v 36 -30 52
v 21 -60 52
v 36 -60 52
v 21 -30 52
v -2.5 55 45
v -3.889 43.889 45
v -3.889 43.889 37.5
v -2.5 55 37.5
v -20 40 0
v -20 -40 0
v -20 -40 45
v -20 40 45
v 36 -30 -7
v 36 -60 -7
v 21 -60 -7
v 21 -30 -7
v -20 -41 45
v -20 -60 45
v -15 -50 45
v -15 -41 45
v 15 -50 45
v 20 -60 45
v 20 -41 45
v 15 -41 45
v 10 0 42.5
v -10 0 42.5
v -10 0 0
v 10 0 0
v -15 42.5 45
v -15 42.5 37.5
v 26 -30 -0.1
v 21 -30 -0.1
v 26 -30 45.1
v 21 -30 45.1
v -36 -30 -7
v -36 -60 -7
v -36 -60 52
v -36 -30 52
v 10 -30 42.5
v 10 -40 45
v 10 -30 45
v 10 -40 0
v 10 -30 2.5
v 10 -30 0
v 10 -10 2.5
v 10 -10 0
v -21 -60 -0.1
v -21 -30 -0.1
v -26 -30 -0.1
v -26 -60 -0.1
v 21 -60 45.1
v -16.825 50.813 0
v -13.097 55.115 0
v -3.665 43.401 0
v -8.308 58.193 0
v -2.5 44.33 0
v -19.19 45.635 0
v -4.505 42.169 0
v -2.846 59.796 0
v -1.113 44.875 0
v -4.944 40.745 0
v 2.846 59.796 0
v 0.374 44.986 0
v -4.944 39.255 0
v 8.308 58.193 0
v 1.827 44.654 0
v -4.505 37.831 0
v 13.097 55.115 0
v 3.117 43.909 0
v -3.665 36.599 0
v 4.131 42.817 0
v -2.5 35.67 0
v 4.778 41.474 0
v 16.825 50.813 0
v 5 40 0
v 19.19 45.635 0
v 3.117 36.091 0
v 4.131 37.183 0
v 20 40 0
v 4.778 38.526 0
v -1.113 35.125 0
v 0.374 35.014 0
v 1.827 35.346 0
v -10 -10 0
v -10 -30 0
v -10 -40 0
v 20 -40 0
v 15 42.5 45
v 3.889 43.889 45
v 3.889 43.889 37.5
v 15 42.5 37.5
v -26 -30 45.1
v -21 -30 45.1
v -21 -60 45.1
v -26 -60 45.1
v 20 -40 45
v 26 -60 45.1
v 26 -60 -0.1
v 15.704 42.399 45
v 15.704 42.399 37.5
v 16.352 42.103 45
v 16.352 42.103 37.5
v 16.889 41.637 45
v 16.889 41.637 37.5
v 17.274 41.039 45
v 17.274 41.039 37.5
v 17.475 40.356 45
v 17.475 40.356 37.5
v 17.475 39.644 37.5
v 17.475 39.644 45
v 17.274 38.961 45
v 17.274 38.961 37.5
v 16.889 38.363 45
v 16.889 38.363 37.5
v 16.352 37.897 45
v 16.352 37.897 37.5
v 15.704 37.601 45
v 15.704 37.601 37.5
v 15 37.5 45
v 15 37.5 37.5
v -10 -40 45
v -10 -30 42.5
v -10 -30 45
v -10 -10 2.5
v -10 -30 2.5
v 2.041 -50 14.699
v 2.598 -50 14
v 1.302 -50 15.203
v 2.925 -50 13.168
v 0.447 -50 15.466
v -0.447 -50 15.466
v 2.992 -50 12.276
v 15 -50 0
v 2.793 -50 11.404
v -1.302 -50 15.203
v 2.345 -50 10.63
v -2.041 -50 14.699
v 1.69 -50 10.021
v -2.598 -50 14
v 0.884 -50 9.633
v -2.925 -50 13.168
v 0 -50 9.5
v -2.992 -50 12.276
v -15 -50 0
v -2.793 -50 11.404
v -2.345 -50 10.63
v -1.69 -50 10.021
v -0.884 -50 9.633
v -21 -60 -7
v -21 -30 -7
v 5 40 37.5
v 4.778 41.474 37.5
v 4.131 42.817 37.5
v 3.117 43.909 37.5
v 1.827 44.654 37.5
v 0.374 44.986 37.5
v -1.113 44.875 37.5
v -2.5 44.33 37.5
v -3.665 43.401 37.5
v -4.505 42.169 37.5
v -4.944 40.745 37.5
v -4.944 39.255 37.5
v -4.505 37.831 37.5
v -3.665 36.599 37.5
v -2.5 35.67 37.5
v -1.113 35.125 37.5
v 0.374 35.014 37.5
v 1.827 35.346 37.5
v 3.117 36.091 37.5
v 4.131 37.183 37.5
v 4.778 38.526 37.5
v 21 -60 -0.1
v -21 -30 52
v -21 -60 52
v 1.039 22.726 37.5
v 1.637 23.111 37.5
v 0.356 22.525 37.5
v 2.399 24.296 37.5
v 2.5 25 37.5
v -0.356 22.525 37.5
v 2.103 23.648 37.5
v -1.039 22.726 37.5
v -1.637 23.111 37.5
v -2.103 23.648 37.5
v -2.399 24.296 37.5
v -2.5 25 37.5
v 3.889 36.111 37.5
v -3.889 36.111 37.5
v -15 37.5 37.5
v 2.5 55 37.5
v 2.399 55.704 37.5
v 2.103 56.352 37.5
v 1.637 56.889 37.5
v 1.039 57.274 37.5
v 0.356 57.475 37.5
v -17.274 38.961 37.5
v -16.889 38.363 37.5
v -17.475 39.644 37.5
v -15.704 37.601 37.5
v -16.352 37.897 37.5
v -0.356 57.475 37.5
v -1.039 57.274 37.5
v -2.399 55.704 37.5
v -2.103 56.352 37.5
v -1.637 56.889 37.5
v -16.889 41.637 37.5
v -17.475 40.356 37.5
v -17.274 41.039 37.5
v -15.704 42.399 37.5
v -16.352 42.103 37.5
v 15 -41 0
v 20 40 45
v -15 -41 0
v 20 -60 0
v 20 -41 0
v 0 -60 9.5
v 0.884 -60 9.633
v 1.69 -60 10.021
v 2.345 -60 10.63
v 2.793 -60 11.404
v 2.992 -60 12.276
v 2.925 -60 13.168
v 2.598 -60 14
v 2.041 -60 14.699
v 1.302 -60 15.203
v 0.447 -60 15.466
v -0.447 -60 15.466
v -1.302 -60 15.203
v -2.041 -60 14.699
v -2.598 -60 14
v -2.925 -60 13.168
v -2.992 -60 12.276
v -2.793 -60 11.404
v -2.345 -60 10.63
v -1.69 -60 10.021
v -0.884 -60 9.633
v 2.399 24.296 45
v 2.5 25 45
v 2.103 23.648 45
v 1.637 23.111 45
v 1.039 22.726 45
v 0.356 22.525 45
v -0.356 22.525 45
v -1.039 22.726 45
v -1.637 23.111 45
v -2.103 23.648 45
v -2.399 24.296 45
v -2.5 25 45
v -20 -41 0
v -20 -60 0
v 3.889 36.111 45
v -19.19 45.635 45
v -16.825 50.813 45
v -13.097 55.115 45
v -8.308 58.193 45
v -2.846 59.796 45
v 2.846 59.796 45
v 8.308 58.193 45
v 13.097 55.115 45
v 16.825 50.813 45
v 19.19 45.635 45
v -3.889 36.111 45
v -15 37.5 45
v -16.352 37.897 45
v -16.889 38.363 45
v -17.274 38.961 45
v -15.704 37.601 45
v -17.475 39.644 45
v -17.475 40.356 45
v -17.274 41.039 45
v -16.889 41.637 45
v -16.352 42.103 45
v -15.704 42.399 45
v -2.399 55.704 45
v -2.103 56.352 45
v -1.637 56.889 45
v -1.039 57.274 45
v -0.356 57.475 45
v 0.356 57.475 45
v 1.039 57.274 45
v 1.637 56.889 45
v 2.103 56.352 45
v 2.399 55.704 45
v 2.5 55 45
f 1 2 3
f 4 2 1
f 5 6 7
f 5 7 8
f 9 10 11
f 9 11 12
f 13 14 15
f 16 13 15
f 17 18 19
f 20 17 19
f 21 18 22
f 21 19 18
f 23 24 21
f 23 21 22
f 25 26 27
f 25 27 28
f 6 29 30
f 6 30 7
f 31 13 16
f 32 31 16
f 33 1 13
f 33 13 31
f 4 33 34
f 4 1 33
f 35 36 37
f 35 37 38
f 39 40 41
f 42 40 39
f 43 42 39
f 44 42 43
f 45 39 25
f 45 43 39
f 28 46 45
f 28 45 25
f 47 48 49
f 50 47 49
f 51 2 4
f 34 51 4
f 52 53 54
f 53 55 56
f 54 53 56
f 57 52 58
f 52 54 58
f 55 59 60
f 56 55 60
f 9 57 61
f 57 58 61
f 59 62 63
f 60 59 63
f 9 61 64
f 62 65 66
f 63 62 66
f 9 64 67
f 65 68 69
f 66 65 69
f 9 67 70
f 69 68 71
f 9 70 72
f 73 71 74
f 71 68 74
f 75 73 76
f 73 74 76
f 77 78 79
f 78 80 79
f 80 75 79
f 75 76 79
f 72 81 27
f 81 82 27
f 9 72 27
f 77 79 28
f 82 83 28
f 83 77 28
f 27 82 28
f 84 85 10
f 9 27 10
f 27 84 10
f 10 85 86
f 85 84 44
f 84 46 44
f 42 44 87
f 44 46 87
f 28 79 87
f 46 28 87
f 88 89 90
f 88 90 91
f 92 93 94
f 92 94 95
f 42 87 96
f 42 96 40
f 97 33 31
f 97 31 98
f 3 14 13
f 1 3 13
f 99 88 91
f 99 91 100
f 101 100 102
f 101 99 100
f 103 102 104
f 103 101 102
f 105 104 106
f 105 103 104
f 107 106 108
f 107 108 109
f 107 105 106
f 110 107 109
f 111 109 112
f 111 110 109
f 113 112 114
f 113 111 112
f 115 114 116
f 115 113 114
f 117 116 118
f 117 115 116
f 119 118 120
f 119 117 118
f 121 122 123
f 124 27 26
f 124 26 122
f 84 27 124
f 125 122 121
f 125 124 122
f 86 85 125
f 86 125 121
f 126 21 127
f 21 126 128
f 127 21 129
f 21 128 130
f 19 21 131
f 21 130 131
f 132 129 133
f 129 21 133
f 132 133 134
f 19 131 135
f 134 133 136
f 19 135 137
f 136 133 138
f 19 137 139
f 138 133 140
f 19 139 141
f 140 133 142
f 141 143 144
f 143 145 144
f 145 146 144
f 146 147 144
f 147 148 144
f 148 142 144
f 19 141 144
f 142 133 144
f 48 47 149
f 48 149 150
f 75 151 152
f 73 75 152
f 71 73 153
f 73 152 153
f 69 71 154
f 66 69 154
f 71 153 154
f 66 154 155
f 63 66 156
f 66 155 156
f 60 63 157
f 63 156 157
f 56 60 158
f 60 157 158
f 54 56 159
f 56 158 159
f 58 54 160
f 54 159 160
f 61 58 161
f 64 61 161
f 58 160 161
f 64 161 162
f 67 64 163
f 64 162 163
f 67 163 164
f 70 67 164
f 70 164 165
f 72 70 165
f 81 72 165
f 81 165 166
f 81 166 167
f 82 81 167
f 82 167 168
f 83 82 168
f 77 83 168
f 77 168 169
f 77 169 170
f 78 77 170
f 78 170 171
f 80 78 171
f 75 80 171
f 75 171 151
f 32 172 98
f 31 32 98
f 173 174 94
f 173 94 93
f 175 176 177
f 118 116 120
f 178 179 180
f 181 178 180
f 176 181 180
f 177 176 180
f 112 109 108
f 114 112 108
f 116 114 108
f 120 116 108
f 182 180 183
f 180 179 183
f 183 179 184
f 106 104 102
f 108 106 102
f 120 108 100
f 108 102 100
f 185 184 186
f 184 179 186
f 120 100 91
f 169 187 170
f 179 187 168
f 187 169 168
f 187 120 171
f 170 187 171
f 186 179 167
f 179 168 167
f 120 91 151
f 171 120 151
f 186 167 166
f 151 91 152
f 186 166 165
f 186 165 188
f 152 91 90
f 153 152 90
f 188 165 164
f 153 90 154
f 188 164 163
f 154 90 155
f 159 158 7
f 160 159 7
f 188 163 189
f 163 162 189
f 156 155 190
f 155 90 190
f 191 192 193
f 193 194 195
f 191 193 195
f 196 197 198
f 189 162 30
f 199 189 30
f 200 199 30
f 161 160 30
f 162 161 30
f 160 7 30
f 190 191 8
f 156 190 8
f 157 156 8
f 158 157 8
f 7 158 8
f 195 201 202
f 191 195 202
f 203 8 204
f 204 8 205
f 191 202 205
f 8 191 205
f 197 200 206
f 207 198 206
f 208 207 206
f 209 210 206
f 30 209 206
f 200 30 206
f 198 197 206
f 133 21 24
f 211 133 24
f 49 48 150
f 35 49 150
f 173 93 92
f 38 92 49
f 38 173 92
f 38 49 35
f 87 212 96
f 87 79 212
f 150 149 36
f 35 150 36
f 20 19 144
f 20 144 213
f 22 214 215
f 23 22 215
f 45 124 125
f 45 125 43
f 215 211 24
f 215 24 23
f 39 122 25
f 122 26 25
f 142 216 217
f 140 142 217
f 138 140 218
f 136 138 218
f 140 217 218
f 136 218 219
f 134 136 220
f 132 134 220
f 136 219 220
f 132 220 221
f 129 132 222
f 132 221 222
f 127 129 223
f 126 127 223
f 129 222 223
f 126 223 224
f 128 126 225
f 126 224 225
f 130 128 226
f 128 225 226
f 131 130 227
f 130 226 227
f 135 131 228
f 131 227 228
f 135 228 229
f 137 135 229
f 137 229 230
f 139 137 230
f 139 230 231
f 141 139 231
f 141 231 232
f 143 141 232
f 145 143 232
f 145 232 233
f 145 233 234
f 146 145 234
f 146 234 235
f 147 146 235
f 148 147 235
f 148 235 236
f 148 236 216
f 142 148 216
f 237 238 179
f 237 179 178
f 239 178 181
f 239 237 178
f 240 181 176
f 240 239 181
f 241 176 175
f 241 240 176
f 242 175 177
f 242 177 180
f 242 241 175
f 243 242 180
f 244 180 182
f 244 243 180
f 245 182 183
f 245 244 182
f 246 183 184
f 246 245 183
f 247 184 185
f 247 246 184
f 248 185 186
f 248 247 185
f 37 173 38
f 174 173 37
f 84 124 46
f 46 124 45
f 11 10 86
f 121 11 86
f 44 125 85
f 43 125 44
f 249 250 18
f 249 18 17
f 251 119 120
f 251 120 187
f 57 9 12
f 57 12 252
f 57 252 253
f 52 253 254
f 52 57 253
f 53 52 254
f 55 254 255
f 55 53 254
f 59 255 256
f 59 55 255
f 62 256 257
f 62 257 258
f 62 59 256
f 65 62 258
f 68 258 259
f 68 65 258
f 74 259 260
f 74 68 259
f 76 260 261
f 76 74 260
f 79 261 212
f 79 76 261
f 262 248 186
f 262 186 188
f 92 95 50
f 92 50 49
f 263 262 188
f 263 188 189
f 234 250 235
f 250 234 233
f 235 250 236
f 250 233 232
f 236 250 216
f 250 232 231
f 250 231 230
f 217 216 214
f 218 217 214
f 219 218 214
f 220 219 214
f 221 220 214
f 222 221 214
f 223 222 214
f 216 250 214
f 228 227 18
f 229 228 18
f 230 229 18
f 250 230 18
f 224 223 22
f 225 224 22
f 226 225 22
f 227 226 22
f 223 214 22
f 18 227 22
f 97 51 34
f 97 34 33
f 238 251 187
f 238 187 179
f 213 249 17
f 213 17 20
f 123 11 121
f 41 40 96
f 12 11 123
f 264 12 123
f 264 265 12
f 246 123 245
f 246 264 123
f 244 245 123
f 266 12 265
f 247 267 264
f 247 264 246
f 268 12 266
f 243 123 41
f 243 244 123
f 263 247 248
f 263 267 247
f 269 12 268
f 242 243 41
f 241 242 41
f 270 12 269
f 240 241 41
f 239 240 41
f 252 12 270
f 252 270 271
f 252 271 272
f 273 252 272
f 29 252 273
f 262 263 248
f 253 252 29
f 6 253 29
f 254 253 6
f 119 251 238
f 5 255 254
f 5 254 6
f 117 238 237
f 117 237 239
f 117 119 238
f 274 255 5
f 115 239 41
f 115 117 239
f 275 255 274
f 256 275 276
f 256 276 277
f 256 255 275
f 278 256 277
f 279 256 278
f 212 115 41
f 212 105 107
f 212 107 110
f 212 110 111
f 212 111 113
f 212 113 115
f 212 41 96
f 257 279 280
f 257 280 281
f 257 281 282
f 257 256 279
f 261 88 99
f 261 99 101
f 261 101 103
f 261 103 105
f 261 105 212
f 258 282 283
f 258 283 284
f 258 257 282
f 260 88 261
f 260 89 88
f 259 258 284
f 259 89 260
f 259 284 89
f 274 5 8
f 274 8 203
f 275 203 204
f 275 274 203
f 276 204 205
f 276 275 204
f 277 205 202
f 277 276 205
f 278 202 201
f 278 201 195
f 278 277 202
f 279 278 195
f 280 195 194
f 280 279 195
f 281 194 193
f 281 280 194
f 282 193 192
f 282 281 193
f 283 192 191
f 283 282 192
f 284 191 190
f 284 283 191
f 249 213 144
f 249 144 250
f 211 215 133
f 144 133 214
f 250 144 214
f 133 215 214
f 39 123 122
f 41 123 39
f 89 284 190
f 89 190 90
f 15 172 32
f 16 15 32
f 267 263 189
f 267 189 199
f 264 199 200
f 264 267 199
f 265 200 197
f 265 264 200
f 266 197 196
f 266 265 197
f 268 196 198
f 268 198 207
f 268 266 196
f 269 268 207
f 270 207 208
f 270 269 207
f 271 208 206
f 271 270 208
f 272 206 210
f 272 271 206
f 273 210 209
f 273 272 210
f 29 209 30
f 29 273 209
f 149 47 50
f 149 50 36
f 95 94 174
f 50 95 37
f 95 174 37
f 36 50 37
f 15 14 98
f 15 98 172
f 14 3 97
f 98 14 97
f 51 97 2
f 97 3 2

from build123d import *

# Parameters (mm, degrees)
SALIENTE_EXTRUIR1_DEPTH = 45
CORTAR_EXTRUIR1_DEPTH   = 7.5
CROQUIS3_R              = 5
CORTAR_EXTRUIR2_DEPTH   = 57.5
CROQUIS4_W              = 41.868476083
CROQUIS4_H              = 21.001033166
CORTAR_EXTRUIR3_DEPTH   = 57.5
CORTAR_EXTRUIR4_START   = -2.5
CORTAR_EXTRUIR4_DEPTH   = 40
CORTAR_EXTRUIR5_DEPTH   = 45
CORTAR_EXTRUIR7_START   = -40
CROQUIS7_W              = 20
CROQUIS7_H              = 10
CORTAR_EXTRUIR7_DEPTH   = 20
SALIENTE_EXTRUIR2_DEPTH = 45
CROQUIS9_W              = 5
CROQUIS9_H              = 10
CORTAR_EXTRUIR8_DEPTH   = 45
CROQUIS10_R             = 3
CORTAR_EXTRUIR9_DEPTH   = 20
CROQUIS11_W             = 40
CROQUIS11_H             = 1
CORTAR_EXTRUIR12_DEPTH  = 45
CROQUIS12_W             = 5
CROQUIS12_H             = 30
SALIENTE_EXTRUIR3_DEPTH = 7
CROQUIS13_W             = 30
CROQUIS13_H             = 52
SALIENTE_EXTRUIR4_DEPTH = 16
CROQUIS14_W             = 30
CROQUIS14_H             = 52
SALIENTE_EXTRUIR5_DEPTH = 16
CROQUIS15_W             = 6
CROQUIS15_H             = 30
CORTAR_EXTRUIR13_DEPTH  = 7
CROQUIS16_W             = 6
CROQUIS16_H             = 30
CORTAR_EXTRUIR14_DEPTH  = 7
CROQUIS17_W             = 1
CROQUIS17_H             = 30
CORTAR_EXTRUIR15_DEPTH  = 45
CROQUIS18_W             = 15
CROQUIS18_H             = 30
SALIENTE_EXTRUIR6_DEPTH = 7
CORTAR_EXTRUIR16_START  = -6.9
CROQUIS19_W             = 5
CROQUIS19_H             = 30
CORTAR_EXTRUIR16_DEPTH  = 45.2
CORTAR_EXTRUIR17_START  = -6.9
CROQUIS20_W             = 5
CROQUIS20_H             = 30
CORTAR_EXTRUIR17_DEPTH  = 45.2


with BuildPart() as part:
    # Croquis1 → Saliente-Extruir1 (new body)
    with BuildSketch(Plane(origin=(0, 0, 0), x_dir=(0, 1, 0), z_dir=(0, 0, 1))):
        with BuildLine():
            Line((0, 20), (40, 20))
            ThreePointArc((40, 20), (60, 0), (40, -20))
            Line((40, -20), (0, -20))
            Line((0, -20), (-40, -20))
            ThreePointArc((-40, -20), (-60, 0), (-40, 20))
            Line((-40, 20), (0, 20))
        make_face()
    extrude(amount=SALIENTE_EXTRUIR1_DEPTH)

    # Croquis2 → Cortar-Extruir1 (cut)
    with BuildSketch(Plane.XY.offset(45)):
        with BuildLine():
            Line((-15, 42.5), (-3.889087297, 43.889087297))
            Line((-3.889087297, 43.889087297), (-2.5, 55))
            ThreePointArc((-2.5, 55), (0, 57.5), (2.5, 55))
            Line((2.5, 55), (3.889087297, 43.889087297))
            Line((3.889087297, 43.889087297), (15, 42.5))
            ThreePointArc((15, 42.5), (17.5, 40), (15, 37.5))
            Line((15, 37.5), (3.889087297, 36.110912703))
            Line((3.889087297, 36.110912703), (2.5, 25))
            ThreePointArc((2.5, 25), (0, 22.5), (-2.5, 25))
            Line((-2.5, 25), (-3.889087297, 36.110912703))
            Line((-3.889087297, 36.110912703), (-15, 37.5))
            ThreePointArc((-15, 37.5), (-17.5, 40), (-15, 42.5))
        make_face()
    extrude(amount=-CORTAR_EXTRUIR1_DEPTH, mode=Mode.SUBTRACT)

    # Croquis3 → Cortar-Extruir2 (cut)
    with BuildSketch(Plane.XY.offset(45)):
        with Locations((0, 40)):
            Circle(CROQUIS3_R)
    extrude(amount=-CORTAR_EXTRUIR2_DEPTH, mode=Mode.SUBTRACT)

    # Croquis4 → Cortar-Extruir3 (cut)
    with BuildSketch(Plane.XY.offset(45)):
        with Locations((-0.934238042, -50.500516583)):
            Rectangle(CROQUIS4_W, CROQUIS4_H)
    extrude(amount=-CORTAR_EXTRUIR3_DEPTH, mode=Mode.SUBTRACT)

    # Croquis5 → Cortar-Extruir4 (cut)
    with BuildSketch(Plane.XY.offset(45).offset(CORTAR_EXTRUIR4_START)):
        Polygon((0, -40), (10, -40), (10, 0), (-10, 0), (-10, -40), align=None)
    extrude(amount=-CORTAR_EXTRUIR4_DEPTH, mode=Mode.SUBTRACT)

    # Croquis6 → Cortar-Extruir5 (cut)
    with BuildSketch(Plane.XY.offset(45)):
        Polygon((0, -40), (-10, -40), (-10, -30), (10, -30), (10, -40), align=None)
    extrude(amount=-CORTAR_EXTRUIR5_DEPTH, mode=Mode.SUBTRACT)

    # Croquis7 → Cortar-Extruir7 (cut)
    with BuildSketch(Plane.XY.offset(45).offset(CORTAR_EXTRUIR7_START)):
        with Locations((0, -5)):
            Rectangle(CROQUIS7_W, CROQUIS7_H)
    extrude(amount=-CORTAR_EXTRUIR7_DEPTH, mode=Mode.SUBTRACT)

    # Croquis8 → Saliente-Extruir2 (add)
    with BuildSketch(Plane(origin=(0, 0, 0), x_dir=(1, 0, 0), z_dir=(0, 0, -1))):
        Polygon((10, 50), (10, 40), (20, 40), (20, 60), (-20, 60), (-20, 40), (-10, 40), (-10, 50), align=None)
    extrude(amount=-SALIENTE_EXTRUIR2_DEPTH)

    # Croquis9 → Cortar-Extruir8 (cut)
    with BuildSketch(Plane(origin=(0, 0, 0), x_dir=(-1, 0, 0), z_dir=(0, 0, -1))):
        with Locations((-12.5, -45)):
            Rectangle(CROQUIS9_W, CROQUIS9_H)
        with Locations((12.5, -45)):
            Rectangle(CROQUIS9_W, CROQUIS9_H)
    extrude(amount=-CORTAR_EXTRUIR8_DEPTH, mode=Mode.SUBTRACT)

    # Croquis10 → Cortar-Extruir9 (cut)
    with BuildSketch(Plane.XZ.offset(60)):
        with Locations(Location((0, 12.5, 0), (0, 0, 270))):
            Circle(CROQUIS10_R)
    extrude(amount=-CORTAR_EXTRUIR9_DEPTH, mode=Mode.SUBTRACT)

    # Croquis11 → Cortar-Extruir12 (cut)
    with BuildSketch(Plane(origin=(0, 0, 0), x_dir=(1, 0, 0), z_dir=(0, 0, -1))):
        with Locations((0, 40.5)):
            Rectangle(CROQUIS11_W, CROQUIS11_H)
    extrude(amount=-CORTAR_EXTRUIR12_DEPTH, mode=Mode.SUBTRACT)


with BuildPart() as cortar_extruir12_piece_1:
    # of the separate pieces the step leaves, piece 1, a body of its own (cortar_extruir12_pieces)
    add(part.part.solids().sort_by_distance((-20, 40, 0))[0])



with BuildPart() as cortar_extruir12_piece_2:
    # of the separate pieces the step leaves, piece 2, a body of its own (cortar_extruir12_pieces)
    add(part.part.solids().sort_by_distance((-20, -41, 0))[0])


with BuildPart() as cortar_extruir12_piece_1_1:
    add(cortar_extruir12_piece_1.part)

    add(cortar_extruir12_piece_2.part)  # Saliente-Extruir3 merges Cortar-Extruir12 piece 2
    # Croquis12 → Saliente-Extruir3 (add)
    with BuildSketch(Plane.XY.offset(45)):
        with Locations((-17.5, -45)):
            Rectangle(CROQUIS12_W, CROQUIS12_H)
        with Locations((17.5, -45)):
            Rectangle(CROQUIS12_W, CROQUIS12_H)
    extrude(amount=SALIENTE_EXTRUIR3_DEPTH)

    # Croquis13 → Saliente-Extruir4 (add)
    with BuildSketch(Plane.YZ.offset(20)):
        with Locations((-45, 26)):
            Rectangle(CROQUIS13_W, CROQUIS13_H)
    extrude(amount=SALIENTE_EXTRUIR4_DEPTH)

    # Croquis14 → Saliente-Extruir5 (add)
    with BuildSketch(Plane(origin=(-20, 0, 0), x_dir=(0, -1, 0), z_dir=(-1, 0, 0))):
        with Locations((45, 26)):
            Rectangle(CROQUIS14_W, CROQUIS14_H)
    extrude(amount=SALIENTE_EXTRUIR5_DEPTH)

    # Croquis15 → Cortar-Extruir13 (cut)
    with BuildSketch(Plane.XY.offset(52)):
        with Locations((18, -45)):
            Rectangle(CROQUIS15_W, CROQUIS15_H)
    extrude(amount=-CORTAR_EXTRUIR13_DEPTH, mode=Mode.SUBTRACT)

    # Croquis16 → Cortar-Extruir14 (cut)
    with BuildSketch(Plane.XY.offset(52)):
        with Locations((-18, -45)):
            Rectangle(CROQUIS16_W, CROQUIS16_H)
    extrude(amount=-CORTAR_EXTRUIR14_DEPTH, mode=Mode.SUBTRACT)

    # Croquis17 → Cortar-Extruir15 (cut)
    with BuildSketch(Plane.XY.offset(45)):
        with Locations((20.5, -45)):
            Rectangle(CROQUIS17_W, CROQUIS17_H)
        with Locations((-20.5, -45)):
            Rectangle(CROQUIS17_W, CROQUIS17_H)
    extrude(amount=-CORTAR_EXTRUIR15_DEPTH, mode=Mode.SUBTRACT)


with BuildPart() as cortar_extruir15_piece_1:
    # of the separate pieces the step leaves, piece 1, a body of its own (cortar_extruir15_pieces)
    add(cortar_extruir12_piece_1_1.part.solids().sort_by_distance((-20, 40, 0))[0])


with BuildPart() as cortar_extruir15_piece_2:
    # of the separate pieces the step leaves, piece 2, a body of its own (cortar_extruir15_pieces)
    add(cortar_extruir12_piece_1_1.part.solids().sort_by_distance((-21, -30, 52))[0])



with BuildPart() as cortar_extruir15_piece_3:
    # of the separate pieces the step leaves, piece 3, a body of its own (cortar_extruir15_pieces)
    add(cortar_extruir12_piece_1_1.part.solids().sort_by_distance((36, -60, 0))[0])


with BuildPart() as cortar_extruir15_piece_4:
    # of the separate pieces the step leaves, piece 4, a body of its own (cortar_extruir15_pieces)
    add(cortar_extruir12_piece_1_1.part.solids().sort_by_distance((-20, -41, 0))[0])


with BuildPart() as cortar_extruir15_piece_2_1:
    add(cortar_extruir15_piece_2.part)

    add(cortar_extruir15_piece_3.part)  # Saliente-Extruir6 merges Cortar-Extruir15 piece 3
    # Croquis18 → Saliente-Extruir6 (add)
    with BuildSketch(Plane(origin=(0, 0, 0), x_dir=(-1, 0, 0), z_dir=(0, 0, -1))):
        with Locations((28.5, -45)):
            Rectangle(CROQUIS18_W, CROQUIS18_H)
        with Locations((-28.5, -45)):
            Rectangle(CROQUIS18_W, CROQUIS18_H)
    extrude(amount=SALIENTE_EXTRUIR6_DEPTH)

    # Croquis19 → Cortar-Extruir16 (cut)
    with BuildSketch(Plane(origin=(0, 0, -7), x_dir=(-1, 0, 0), z_dir=(0, 0, -1)).offset(CORTAR_EXTRUIR16_START)):
        with Locations((23.5, -45)):
            Rectangle(CROQUIS19_W, CROQUIS19_H)
    extrude(amount=-CORTAR_EXTRUIR16_DEPTH, mode=Mode.SUBTRACT)

    # Croquis20 → Cortar-Extruir17 (cut)
    with BuildSketch(Plane(origin=(0, 0, -7), x_dir=(1, 0, 0), z_dir=(0, 0, -1)).offset(CORTAR_EXTRUIR17_START)):
        with Locations((23.5, 45)):
            Rectangle(CROQUIS20_W, CROQUIS20_H)
    extrude(amount=-CORTAR_EXTRUIR17_DEPTH, mode=Mode.SUBTRACT)


solid = Compound([cortar_extruir15_piece_1.part, cortar_extruir15_piece_4.part, cortar_extruir15_piece_2_1.part])
